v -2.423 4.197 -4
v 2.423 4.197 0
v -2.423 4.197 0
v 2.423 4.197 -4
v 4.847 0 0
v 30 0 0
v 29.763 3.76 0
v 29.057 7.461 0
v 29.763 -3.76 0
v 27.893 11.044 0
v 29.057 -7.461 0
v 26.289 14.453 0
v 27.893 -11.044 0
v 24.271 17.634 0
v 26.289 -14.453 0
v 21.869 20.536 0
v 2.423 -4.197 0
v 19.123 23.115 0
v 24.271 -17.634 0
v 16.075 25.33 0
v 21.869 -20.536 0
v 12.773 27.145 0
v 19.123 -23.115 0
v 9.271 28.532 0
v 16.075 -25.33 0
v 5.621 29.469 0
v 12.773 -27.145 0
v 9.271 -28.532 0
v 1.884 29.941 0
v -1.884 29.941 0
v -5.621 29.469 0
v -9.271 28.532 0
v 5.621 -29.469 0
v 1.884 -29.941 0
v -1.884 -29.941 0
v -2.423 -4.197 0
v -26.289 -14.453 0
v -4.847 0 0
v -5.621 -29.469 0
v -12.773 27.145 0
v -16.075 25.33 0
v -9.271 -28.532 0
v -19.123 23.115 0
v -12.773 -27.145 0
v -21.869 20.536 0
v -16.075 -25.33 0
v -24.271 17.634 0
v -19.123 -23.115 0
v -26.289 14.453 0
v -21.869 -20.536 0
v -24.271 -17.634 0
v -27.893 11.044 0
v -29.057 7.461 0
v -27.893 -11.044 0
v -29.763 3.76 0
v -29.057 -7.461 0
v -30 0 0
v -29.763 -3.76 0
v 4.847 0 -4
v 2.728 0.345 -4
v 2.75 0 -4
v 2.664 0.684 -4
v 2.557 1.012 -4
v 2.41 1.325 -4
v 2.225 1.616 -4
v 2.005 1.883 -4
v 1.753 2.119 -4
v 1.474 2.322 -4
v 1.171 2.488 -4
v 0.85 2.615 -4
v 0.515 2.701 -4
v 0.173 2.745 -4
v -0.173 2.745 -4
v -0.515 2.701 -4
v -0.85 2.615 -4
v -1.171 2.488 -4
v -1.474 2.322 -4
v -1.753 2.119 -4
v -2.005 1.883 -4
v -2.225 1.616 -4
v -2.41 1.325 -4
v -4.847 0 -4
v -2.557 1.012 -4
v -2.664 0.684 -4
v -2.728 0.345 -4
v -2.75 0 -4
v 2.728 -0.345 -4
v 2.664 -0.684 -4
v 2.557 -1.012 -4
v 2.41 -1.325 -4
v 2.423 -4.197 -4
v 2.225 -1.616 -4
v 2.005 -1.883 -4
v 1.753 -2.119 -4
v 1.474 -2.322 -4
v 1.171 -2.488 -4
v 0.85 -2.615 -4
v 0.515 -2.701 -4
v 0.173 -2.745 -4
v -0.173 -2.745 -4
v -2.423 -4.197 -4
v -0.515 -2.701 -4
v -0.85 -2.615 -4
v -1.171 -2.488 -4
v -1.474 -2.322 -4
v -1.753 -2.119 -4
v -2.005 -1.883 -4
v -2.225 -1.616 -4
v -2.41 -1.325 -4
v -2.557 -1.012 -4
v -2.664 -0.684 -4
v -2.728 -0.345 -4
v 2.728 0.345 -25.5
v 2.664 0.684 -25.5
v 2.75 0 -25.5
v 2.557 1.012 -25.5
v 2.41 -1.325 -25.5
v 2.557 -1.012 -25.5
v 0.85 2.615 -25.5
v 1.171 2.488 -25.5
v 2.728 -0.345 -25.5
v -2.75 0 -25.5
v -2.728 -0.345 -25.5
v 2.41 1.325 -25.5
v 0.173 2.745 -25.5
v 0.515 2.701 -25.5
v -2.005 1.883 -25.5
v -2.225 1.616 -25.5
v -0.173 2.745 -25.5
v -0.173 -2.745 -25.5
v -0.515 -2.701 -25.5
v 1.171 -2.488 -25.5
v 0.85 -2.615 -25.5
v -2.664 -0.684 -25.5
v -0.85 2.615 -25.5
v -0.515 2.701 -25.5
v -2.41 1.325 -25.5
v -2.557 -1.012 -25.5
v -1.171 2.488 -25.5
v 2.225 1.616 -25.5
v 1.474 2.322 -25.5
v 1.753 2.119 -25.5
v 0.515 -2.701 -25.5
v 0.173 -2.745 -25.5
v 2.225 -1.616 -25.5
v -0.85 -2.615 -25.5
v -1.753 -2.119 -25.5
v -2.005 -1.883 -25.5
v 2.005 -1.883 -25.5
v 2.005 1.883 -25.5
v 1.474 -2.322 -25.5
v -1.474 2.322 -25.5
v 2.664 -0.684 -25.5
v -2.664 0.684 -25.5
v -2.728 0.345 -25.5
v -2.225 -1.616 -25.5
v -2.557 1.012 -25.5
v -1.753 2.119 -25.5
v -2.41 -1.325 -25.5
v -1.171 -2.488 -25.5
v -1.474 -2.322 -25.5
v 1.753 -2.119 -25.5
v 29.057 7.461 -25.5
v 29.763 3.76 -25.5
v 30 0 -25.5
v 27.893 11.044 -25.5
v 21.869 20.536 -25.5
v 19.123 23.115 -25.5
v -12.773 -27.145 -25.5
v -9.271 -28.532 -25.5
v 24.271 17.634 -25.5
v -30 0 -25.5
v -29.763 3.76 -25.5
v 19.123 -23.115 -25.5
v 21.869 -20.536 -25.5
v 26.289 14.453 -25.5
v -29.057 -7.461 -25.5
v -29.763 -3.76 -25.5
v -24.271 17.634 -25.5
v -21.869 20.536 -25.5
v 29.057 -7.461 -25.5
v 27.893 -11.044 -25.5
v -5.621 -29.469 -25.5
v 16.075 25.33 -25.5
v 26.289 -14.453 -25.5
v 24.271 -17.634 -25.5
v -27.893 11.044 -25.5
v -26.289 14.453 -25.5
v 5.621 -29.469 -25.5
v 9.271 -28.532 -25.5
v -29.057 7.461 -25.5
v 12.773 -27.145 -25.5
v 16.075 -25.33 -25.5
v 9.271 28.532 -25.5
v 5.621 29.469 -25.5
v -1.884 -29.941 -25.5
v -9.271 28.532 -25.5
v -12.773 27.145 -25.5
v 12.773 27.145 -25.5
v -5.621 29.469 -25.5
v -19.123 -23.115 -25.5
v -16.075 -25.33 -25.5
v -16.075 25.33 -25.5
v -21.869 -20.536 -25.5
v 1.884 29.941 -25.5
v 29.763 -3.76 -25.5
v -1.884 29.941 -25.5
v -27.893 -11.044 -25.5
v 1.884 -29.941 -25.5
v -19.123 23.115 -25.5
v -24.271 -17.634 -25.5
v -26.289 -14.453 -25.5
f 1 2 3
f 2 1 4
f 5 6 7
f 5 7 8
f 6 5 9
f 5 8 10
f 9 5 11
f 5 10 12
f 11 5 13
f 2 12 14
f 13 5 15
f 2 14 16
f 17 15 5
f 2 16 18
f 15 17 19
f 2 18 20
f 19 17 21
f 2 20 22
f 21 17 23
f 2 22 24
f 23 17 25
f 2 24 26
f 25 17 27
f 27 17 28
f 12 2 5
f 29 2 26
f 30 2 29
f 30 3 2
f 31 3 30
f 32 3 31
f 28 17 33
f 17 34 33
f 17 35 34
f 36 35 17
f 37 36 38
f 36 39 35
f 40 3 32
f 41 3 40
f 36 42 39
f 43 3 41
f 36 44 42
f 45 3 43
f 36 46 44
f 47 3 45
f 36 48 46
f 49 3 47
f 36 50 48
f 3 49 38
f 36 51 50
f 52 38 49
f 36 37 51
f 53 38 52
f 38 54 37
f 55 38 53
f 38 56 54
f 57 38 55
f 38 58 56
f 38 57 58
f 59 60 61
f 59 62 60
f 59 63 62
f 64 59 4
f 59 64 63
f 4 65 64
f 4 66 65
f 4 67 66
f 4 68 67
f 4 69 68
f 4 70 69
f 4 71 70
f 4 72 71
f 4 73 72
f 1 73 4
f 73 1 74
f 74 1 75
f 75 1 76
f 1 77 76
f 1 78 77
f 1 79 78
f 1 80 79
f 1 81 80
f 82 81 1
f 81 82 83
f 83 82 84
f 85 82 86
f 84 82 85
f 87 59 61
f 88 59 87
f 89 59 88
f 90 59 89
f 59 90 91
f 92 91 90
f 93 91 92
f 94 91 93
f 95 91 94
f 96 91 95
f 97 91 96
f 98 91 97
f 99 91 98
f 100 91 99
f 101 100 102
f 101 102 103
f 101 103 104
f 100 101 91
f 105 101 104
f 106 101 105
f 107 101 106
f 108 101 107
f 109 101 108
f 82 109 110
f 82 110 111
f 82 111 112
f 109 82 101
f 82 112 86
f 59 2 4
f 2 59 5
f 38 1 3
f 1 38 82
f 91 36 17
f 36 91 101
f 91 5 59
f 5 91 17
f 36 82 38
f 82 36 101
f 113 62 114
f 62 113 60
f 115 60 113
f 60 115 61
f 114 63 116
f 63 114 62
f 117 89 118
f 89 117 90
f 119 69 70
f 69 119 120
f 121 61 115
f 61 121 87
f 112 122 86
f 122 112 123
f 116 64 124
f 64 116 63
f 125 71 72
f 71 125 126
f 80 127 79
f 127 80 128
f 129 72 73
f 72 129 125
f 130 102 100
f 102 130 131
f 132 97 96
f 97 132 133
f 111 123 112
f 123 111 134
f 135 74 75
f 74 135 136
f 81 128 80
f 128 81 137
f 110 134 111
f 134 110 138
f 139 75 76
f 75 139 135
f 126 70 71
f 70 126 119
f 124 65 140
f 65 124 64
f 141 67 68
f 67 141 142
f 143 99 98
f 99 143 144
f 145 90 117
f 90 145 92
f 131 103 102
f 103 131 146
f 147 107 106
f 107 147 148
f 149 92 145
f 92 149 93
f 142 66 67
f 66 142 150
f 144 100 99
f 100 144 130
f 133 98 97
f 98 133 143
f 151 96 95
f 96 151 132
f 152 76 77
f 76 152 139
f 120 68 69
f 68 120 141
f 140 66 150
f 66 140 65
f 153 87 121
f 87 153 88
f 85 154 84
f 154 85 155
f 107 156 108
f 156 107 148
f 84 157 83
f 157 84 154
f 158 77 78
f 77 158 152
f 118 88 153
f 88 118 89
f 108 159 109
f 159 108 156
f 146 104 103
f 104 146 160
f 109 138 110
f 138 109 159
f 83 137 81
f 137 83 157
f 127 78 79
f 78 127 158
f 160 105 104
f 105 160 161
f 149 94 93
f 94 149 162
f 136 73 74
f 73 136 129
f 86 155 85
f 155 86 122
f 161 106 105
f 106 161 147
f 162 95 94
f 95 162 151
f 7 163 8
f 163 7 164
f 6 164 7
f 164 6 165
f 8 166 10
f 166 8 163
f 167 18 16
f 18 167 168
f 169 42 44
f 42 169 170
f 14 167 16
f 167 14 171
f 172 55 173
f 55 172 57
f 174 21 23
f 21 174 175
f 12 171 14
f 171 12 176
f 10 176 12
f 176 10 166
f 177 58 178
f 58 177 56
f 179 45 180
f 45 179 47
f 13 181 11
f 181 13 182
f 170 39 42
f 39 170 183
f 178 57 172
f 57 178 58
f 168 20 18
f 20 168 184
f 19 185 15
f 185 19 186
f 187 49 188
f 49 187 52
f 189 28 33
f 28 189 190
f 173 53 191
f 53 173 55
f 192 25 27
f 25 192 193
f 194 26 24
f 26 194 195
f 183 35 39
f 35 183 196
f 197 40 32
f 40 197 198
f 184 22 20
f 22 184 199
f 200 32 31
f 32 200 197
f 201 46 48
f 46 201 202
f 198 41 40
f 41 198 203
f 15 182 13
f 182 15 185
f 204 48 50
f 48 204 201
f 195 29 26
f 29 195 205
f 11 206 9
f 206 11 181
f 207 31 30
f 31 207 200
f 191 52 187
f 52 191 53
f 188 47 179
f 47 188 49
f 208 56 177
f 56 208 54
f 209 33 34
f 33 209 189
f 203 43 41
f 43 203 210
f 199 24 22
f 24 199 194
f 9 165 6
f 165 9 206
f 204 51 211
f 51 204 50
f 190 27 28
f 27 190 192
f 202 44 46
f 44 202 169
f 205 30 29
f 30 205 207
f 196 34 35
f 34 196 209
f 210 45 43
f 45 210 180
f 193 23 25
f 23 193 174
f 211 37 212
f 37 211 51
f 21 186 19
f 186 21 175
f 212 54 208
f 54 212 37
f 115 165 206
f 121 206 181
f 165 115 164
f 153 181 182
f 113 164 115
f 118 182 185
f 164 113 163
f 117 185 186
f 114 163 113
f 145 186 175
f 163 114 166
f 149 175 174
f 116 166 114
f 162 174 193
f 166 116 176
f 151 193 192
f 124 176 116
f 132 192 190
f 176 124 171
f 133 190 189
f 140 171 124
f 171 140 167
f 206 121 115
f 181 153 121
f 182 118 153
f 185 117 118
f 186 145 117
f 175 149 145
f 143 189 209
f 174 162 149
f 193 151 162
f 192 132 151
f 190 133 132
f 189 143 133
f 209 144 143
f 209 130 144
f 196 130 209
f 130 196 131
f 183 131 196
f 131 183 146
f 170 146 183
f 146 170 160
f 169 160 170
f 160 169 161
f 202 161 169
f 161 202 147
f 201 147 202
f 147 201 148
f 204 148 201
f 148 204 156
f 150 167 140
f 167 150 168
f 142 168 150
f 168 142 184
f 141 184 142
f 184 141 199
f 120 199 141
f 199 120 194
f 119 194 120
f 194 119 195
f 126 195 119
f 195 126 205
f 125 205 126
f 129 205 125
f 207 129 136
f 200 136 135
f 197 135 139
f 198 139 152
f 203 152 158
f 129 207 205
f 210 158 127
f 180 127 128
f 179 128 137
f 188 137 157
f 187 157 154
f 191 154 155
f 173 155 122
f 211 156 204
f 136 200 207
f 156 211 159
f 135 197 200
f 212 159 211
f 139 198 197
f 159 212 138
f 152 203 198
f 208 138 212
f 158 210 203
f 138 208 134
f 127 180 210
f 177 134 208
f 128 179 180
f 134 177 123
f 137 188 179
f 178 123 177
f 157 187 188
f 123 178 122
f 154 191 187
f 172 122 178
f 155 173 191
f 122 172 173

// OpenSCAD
$fn = 50;

difference() {
	union() {
		translate(v = [0, 0, -25.5]) {
			cylinder(h = 25.5, r = 30.0);
		}
	}
	union() {
		translate(v = [0, 0, 0]) {
			rotate(a = [0, 0, 0]) {
				difference() {
					union() {
						translate(v = [0, 0, -4]) {
							linear_extrude(height = 4) {
								polygon(points = [[4.8468, 0.0], [2.4234000000000004, 4.197451927062417], [-2.423399999999999, 4.197451927062417], [-4.8468, 5.935618106107392e-16], [-2.423400000000002, -4.197451927062416], [2.423399999999997, -4.197451927062419]]);
							}
						}
					}
					union();
				}
			}
		}
		#translate(v = [0, 0, -100.0]) {
			cylinder(h = 200, r = 2.75);
		}
	}
}
